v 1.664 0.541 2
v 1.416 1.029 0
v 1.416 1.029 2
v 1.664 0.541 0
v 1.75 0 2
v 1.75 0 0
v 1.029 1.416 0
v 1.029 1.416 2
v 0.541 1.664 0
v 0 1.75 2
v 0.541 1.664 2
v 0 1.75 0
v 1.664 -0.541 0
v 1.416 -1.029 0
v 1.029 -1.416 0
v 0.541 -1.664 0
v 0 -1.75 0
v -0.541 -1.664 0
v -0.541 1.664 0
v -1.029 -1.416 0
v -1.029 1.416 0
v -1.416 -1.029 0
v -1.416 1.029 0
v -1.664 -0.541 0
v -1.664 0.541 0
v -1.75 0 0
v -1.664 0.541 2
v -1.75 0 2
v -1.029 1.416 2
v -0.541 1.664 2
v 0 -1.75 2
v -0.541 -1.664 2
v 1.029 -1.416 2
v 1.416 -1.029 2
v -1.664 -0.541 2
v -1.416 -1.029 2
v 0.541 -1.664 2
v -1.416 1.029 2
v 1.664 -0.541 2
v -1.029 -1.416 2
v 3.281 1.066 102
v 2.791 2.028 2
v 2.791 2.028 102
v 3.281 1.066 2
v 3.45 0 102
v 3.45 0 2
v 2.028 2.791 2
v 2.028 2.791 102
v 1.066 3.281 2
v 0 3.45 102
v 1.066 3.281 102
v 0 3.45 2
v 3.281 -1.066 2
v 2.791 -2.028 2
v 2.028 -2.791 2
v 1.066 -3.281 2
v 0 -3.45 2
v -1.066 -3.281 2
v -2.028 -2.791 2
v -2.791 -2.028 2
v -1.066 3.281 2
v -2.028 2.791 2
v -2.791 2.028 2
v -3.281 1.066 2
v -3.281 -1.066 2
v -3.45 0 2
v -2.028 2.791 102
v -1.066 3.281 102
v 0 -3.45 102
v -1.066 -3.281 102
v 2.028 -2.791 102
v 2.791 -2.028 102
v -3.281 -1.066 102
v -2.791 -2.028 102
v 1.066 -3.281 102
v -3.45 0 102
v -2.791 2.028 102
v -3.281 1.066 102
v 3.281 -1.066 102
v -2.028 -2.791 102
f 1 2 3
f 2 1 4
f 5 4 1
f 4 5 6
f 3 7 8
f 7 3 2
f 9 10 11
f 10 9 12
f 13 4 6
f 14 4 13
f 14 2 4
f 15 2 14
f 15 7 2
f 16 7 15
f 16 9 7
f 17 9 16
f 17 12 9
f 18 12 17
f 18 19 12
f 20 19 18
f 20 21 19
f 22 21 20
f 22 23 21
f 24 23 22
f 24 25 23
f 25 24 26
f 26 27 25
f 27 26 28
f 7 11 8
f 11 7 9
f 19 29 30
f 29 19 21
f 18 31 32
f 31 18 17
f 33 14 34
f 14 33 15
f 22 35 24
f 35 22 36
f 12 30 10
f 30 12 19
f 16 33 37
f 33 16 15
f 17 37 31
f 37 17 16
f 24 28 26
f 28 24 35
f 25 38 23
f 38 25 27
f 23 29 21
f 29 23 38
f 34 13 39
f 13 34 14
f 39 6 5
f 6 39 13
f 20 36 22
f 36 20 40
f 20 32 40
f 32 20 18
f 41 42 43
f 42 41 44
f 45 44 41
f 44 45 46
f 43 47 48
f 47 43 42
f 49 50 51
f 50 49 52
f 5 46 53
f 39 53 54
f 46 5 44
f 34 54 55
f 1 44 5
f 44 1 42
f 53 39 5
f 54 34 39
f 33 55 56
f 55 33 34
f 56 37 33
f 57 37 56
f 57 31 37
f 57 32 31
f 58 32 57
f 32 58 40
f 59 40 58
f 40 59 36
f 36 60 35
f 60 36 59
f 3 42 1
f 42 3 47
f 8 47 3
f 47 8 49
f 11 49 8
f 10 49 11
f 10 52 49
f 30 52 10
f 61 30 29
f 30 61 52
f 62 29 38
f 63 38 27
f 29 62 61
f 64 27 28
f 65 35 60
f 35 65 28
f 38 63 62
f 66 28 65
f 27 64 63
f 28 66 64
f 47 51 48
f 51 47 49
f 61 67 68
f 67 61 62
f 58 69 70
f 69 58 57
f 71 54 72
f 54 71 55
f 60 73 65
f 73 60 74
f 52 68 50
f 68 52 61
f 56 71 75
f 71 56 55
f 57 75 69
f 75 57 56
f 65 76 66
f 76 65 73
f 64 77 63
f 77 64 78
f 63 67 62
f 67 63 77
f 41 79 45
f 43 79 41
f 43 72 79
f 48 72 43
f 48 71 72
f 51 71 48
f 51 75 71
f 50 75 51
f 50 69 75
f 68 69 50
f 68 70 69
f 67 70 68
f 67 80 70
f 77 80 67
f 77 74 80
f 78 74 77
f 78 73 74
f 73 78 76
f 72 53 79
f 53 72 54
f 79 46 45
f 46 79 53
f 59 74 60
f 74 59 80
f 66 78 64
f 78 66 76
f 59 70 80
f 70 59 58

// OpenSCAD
// file: ../config.scad
SCREW_MAIN_DIAMETER = 3.5;
SCREW_MAIN_EMBED = 2;
SCREW_HEAD_DIAMETER = 6.9;
SCREW_HEAD_EMBED = 2.6;
SCREW_FREE_SPACE = 100;
SCREW_ARC_FN = 20; // see https://en.wikibooks.org/wiki/OpenSCAD_User_Manual/Other_Language_Features#.24fa.2C_.24fs_and_.24fn

WALL_ATTACHMENT_THICKNESS = SCREW_MAIN_EMBED + SCREW_HEAD_EMBED;
// main file
include <../config.scad>;

// Example:
screwHole();

module screwHole() {
  // Main:
  cylinder(SCREW_FREE_SPACE, r = SCREW_MAIN_DIAMETER / 2, $fn = SCREW_ARC_FN);
  // Head embed:
  translate([ 0, 0, WALL_ATTACHMENT_THICKNESS - SCREW_HEAD_EMBED ])
  cylinder(SCREW_FREE_SPACE, r = SCREW_HEAD_DIAMETER / 2, $fn = SCREW_ARC_FN);
}
